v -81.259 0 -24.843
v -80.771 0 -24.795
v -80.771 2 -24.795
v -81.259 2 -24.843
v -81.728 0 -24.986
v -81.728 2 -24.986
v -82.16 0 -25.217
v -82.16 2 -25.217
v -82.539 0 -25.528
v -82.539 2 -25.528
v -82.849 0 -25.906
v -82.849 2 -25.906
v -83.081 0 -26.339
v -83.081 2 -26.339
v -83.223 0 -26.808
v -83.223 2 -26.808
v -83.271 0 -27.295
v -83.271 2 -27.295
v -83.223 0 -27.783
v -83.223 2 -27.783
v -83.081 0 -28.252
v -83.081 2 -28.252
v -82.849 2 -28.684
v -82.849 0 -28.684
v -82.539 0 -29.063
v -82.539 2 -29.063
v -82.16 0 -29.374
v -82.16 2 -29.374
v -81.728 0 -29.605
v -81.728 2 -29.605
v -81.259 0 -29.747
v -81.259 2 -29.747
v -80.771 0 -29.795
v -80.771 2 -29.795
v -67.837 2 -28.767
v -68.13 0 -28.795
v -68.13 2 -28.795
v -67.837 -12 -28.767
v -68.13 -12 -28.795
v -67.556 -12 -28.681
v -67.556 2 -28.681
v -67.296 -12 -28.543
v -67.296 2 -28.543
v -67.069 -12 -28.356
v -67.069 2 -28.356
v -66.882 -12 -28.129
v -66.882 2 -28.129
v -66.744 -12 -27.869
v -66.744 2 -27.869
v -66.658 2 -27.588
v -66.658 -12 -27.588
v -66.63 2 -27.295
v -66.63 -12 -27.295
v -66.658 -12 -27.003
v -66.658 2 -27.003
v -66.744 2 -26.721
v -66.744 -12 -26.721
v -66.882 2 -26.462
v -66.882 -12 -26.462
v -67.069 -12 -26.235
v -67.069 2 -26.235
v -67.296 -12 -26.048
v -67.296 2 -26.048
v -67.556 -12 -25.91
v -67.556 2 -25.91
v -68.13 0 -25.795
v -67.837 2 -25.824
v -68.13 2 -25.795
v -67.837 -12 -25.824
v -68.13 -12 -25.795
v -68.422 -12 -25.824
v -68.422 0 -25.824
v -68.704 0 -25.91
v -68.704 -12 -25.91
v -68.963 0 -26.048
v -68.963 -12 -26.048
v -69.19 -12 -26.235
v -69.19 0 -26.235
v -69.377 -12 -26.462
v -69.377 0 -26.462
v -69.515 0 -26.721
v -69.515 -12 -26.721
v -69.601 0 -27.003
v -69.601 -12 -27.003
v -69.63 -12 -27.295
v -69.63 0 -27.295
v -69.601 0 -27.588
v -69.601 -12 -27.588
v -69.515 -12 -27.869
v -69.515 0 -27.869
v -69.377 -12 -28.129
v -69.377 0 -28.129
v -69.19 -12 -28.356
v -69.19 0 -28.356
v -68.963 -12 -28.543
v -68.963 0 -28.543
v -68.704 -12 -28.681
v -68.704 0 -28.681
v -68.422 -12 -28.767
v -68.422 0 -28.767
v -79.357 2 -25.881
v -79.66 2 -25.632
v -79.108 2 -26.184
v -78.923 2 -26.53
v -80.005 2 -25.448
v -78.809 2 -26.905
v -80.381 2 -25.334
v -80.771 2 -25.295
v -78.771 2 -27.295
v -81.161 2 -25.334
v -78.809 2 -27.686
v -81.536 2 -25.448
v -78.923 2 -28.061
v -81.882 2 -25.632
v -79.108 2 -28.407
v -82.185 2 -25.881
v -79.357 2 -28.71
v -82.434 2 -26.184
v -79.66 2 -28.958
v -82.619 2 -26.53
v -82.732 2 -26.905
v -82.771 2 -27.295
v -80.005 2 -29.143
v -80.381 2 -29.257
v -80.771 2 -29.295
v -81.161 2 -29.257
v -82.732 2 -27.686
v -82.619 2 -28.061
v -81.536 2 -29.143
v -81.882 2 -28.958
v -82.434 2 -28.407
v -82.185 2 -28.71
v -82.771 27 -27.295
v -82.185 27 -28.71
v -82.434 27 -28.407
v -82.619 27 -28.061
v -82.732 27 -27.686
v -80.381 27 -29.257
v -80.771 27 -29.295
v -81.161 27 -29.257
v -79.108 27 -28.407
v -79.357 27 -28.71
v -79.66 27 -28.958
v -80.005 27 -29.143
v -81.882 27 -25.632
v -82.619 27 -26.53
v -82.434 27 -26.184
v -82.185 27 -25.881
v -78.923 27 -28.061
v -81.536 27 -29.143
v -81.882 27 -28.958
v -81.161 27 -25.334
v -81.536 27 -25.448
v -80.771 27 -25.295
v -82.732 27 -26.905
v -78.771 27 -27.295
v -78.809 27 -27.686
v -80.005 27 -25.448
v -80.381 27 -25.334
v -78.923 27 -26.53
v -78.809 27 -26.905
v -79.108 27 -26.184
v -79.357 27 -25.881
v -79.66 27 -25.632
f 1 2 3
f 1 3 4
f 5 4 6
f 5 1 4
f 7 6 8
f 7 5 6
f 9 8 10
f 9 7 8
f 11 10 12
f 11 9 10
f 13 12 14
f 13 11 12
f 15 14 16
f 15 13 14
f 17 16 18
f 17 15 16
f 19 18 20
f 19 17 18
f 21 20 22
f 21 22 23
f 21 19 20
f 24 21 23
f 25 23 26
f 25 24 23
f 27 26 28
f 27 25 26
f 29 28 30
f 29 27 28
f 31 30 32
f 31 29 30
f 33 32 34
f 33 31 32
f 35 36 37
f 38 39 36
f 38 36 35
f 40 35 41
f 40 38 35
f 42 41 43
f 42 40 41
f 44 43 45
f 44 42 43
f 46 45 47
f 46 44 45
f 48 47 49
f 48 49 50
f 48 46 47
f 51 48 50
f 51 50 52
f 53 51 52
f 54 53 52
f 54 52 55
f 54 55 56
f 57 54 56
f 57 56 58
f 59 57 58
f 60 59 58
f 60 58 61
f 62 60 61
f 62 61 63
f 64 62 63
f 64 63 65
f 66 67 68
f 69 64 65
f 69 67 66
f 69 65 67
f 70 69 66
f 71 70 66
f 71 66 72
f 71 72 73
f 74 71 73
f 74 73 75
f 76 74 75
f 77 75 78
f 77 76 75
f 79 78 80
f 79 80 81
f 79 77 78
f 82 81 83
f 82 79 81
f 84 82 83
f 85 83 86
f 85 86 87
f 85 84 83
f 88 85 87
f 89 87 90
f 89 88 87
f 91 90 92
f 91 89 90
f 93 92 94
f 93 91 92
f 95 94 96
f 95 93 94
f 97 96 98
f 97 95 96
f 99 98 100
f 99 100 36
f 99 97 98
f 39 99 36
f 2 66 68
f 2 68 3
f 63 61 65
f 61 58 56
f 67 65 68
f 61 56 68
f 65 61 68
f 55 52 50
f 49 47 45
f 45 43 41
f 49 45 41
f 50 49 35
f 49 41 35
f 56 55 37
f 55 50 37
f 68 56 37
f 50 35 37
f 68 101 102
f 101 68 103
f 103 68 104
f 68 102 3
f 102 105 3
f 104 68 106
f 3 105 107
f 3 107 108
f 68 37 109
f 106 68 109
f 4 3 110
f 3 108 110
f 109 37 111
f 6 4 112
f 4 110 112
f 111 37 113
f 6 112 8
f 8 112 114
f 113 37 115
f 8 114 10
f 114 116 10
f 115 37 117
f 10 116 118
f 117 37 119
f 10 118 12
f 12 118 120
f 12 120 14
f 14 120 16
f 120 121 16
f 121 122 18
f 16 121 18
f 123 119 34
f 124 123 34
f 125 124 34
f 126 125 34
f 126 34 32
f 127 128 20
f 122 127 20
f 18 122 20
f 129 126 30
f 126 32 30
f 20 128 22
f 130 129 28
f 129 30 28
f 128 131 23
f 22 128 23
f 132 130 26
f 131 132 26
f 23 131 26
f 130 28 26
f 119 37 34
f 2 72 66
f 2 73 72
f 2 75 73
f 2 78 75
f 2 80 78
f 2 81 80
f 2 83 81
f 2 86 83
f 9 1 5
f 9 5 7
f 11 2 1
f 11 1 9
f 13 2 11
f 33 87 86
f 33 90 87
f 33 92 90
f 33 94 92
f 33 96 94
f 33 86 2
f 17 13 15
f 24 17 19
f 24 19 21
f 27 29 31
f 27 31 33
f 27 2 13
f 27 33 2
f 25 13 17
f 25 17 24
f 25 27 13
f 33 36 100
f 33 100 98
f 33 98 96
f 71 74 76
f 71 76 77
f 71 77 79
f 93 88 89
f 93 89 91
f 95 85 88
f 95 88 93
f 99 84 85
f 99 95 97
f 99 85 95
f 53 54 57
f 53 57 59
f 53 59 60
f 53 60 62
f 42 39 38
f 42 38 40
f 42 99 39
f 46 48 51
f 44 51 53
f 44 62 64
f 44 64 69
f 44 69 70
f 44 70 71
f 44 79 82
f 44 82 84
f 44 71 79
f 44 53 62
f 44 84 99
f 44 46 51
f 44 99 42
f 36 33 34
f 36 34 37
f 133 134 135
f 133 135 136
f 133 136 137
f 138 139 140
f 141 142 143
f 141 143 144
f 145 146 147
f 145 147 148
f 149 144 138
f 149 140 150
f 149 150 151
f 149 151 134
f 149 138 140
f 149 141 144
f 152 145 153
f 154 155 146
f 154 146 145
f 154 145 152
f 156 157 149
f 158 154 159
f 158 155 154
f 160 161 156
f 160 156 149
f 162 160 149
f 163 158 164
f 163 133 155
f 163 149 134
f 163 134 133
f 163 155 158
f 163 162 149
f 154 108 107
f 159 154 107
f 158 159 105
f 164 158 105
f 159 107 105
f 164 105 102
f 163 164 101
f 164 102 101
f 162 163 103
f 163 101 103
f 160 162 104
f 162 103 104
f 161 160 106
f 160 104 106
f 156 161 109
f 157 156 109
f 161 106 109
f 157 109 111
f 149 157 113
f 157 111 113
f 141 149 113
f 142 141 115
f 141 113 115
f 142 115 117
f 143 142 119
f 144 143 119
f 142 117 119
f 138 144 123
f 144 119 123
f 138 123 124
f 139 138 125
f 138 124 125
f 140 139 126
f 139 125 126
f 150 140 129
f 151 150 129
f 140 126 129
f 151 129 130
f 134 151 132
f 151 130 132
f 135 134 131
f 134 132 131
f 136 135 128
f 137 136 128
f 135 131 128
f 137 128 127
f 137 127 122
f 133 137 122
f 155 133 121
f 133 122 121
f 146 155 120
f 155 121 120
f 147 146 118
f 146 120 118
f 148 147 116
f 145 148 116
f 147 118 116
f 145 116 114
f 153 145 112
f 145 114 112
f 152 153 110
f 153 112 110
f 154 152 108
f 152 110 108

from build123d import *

# Parameters (mm, degrees)
BOSS_EXTRUDE5_DEPTH = 2
SKETCH5_R           = 2
BOSS_EXTRUDE6_DEPTH = 25
BOSS_EXTRUDE7_START = 12
SKETCH6_R           = 1.5
BOSS_EXTRUDE7_DEPTH = 12


with BuildPart() as part:
    # Sketch1 → Boss-Extrude5 (new body)
    with BuildSketch(Plane(origin=(0, 0, 0), x_dir=(1, 0, 0), z_dir=(0, 1, 0))):
        with BuildLine():
            Line((-80.770804267, 29.795413952), (-68.129526639, 28.795413952))
            ThreePointArc((-68.129526639, 28.795413952), (-66.629526639, 27.295413952), (-68.129526639, 25.795413952))
            Line((-68.129526639, 25.795413952), (-80.770804267, 24.795413952))
            ThreePointArc((-80.770804267, 24.795413952), (-83.270804267, 27.295413952), (-80.770804267, 29.795413952))
        make_face()
    extrude(amount=BOSS_EXTRUDE5_DEPTH)

    # Sketch5 → Boss-Extrude6 (add)
    with BuildSketch(Plane(origin=(0, 2, 0), x_dir=(1, 0, 0), z_dir=(0, 1, 0))):
        with Locations(Location((-80.770804267, 27.295413952, 0), (0, 0, 270))):
            Circle(SKETCH5_R)
    extrude(amount=BOSS_EXTRUDE6_DEPTH)

    # Sketch6 → Boss-Extrude7 (add)
    with BuildSketch(Plane.XZ.offset(BOSS_EXTRUDE7_START)):
        with Locations(Location((-68.129526639, -27.295413952, 0), (0, 0, 270))):
            Circle(SKETCH6_R)
    extrude(amount=-BOSS_EXTRUDE7_DEPTH)


solid = part.part
